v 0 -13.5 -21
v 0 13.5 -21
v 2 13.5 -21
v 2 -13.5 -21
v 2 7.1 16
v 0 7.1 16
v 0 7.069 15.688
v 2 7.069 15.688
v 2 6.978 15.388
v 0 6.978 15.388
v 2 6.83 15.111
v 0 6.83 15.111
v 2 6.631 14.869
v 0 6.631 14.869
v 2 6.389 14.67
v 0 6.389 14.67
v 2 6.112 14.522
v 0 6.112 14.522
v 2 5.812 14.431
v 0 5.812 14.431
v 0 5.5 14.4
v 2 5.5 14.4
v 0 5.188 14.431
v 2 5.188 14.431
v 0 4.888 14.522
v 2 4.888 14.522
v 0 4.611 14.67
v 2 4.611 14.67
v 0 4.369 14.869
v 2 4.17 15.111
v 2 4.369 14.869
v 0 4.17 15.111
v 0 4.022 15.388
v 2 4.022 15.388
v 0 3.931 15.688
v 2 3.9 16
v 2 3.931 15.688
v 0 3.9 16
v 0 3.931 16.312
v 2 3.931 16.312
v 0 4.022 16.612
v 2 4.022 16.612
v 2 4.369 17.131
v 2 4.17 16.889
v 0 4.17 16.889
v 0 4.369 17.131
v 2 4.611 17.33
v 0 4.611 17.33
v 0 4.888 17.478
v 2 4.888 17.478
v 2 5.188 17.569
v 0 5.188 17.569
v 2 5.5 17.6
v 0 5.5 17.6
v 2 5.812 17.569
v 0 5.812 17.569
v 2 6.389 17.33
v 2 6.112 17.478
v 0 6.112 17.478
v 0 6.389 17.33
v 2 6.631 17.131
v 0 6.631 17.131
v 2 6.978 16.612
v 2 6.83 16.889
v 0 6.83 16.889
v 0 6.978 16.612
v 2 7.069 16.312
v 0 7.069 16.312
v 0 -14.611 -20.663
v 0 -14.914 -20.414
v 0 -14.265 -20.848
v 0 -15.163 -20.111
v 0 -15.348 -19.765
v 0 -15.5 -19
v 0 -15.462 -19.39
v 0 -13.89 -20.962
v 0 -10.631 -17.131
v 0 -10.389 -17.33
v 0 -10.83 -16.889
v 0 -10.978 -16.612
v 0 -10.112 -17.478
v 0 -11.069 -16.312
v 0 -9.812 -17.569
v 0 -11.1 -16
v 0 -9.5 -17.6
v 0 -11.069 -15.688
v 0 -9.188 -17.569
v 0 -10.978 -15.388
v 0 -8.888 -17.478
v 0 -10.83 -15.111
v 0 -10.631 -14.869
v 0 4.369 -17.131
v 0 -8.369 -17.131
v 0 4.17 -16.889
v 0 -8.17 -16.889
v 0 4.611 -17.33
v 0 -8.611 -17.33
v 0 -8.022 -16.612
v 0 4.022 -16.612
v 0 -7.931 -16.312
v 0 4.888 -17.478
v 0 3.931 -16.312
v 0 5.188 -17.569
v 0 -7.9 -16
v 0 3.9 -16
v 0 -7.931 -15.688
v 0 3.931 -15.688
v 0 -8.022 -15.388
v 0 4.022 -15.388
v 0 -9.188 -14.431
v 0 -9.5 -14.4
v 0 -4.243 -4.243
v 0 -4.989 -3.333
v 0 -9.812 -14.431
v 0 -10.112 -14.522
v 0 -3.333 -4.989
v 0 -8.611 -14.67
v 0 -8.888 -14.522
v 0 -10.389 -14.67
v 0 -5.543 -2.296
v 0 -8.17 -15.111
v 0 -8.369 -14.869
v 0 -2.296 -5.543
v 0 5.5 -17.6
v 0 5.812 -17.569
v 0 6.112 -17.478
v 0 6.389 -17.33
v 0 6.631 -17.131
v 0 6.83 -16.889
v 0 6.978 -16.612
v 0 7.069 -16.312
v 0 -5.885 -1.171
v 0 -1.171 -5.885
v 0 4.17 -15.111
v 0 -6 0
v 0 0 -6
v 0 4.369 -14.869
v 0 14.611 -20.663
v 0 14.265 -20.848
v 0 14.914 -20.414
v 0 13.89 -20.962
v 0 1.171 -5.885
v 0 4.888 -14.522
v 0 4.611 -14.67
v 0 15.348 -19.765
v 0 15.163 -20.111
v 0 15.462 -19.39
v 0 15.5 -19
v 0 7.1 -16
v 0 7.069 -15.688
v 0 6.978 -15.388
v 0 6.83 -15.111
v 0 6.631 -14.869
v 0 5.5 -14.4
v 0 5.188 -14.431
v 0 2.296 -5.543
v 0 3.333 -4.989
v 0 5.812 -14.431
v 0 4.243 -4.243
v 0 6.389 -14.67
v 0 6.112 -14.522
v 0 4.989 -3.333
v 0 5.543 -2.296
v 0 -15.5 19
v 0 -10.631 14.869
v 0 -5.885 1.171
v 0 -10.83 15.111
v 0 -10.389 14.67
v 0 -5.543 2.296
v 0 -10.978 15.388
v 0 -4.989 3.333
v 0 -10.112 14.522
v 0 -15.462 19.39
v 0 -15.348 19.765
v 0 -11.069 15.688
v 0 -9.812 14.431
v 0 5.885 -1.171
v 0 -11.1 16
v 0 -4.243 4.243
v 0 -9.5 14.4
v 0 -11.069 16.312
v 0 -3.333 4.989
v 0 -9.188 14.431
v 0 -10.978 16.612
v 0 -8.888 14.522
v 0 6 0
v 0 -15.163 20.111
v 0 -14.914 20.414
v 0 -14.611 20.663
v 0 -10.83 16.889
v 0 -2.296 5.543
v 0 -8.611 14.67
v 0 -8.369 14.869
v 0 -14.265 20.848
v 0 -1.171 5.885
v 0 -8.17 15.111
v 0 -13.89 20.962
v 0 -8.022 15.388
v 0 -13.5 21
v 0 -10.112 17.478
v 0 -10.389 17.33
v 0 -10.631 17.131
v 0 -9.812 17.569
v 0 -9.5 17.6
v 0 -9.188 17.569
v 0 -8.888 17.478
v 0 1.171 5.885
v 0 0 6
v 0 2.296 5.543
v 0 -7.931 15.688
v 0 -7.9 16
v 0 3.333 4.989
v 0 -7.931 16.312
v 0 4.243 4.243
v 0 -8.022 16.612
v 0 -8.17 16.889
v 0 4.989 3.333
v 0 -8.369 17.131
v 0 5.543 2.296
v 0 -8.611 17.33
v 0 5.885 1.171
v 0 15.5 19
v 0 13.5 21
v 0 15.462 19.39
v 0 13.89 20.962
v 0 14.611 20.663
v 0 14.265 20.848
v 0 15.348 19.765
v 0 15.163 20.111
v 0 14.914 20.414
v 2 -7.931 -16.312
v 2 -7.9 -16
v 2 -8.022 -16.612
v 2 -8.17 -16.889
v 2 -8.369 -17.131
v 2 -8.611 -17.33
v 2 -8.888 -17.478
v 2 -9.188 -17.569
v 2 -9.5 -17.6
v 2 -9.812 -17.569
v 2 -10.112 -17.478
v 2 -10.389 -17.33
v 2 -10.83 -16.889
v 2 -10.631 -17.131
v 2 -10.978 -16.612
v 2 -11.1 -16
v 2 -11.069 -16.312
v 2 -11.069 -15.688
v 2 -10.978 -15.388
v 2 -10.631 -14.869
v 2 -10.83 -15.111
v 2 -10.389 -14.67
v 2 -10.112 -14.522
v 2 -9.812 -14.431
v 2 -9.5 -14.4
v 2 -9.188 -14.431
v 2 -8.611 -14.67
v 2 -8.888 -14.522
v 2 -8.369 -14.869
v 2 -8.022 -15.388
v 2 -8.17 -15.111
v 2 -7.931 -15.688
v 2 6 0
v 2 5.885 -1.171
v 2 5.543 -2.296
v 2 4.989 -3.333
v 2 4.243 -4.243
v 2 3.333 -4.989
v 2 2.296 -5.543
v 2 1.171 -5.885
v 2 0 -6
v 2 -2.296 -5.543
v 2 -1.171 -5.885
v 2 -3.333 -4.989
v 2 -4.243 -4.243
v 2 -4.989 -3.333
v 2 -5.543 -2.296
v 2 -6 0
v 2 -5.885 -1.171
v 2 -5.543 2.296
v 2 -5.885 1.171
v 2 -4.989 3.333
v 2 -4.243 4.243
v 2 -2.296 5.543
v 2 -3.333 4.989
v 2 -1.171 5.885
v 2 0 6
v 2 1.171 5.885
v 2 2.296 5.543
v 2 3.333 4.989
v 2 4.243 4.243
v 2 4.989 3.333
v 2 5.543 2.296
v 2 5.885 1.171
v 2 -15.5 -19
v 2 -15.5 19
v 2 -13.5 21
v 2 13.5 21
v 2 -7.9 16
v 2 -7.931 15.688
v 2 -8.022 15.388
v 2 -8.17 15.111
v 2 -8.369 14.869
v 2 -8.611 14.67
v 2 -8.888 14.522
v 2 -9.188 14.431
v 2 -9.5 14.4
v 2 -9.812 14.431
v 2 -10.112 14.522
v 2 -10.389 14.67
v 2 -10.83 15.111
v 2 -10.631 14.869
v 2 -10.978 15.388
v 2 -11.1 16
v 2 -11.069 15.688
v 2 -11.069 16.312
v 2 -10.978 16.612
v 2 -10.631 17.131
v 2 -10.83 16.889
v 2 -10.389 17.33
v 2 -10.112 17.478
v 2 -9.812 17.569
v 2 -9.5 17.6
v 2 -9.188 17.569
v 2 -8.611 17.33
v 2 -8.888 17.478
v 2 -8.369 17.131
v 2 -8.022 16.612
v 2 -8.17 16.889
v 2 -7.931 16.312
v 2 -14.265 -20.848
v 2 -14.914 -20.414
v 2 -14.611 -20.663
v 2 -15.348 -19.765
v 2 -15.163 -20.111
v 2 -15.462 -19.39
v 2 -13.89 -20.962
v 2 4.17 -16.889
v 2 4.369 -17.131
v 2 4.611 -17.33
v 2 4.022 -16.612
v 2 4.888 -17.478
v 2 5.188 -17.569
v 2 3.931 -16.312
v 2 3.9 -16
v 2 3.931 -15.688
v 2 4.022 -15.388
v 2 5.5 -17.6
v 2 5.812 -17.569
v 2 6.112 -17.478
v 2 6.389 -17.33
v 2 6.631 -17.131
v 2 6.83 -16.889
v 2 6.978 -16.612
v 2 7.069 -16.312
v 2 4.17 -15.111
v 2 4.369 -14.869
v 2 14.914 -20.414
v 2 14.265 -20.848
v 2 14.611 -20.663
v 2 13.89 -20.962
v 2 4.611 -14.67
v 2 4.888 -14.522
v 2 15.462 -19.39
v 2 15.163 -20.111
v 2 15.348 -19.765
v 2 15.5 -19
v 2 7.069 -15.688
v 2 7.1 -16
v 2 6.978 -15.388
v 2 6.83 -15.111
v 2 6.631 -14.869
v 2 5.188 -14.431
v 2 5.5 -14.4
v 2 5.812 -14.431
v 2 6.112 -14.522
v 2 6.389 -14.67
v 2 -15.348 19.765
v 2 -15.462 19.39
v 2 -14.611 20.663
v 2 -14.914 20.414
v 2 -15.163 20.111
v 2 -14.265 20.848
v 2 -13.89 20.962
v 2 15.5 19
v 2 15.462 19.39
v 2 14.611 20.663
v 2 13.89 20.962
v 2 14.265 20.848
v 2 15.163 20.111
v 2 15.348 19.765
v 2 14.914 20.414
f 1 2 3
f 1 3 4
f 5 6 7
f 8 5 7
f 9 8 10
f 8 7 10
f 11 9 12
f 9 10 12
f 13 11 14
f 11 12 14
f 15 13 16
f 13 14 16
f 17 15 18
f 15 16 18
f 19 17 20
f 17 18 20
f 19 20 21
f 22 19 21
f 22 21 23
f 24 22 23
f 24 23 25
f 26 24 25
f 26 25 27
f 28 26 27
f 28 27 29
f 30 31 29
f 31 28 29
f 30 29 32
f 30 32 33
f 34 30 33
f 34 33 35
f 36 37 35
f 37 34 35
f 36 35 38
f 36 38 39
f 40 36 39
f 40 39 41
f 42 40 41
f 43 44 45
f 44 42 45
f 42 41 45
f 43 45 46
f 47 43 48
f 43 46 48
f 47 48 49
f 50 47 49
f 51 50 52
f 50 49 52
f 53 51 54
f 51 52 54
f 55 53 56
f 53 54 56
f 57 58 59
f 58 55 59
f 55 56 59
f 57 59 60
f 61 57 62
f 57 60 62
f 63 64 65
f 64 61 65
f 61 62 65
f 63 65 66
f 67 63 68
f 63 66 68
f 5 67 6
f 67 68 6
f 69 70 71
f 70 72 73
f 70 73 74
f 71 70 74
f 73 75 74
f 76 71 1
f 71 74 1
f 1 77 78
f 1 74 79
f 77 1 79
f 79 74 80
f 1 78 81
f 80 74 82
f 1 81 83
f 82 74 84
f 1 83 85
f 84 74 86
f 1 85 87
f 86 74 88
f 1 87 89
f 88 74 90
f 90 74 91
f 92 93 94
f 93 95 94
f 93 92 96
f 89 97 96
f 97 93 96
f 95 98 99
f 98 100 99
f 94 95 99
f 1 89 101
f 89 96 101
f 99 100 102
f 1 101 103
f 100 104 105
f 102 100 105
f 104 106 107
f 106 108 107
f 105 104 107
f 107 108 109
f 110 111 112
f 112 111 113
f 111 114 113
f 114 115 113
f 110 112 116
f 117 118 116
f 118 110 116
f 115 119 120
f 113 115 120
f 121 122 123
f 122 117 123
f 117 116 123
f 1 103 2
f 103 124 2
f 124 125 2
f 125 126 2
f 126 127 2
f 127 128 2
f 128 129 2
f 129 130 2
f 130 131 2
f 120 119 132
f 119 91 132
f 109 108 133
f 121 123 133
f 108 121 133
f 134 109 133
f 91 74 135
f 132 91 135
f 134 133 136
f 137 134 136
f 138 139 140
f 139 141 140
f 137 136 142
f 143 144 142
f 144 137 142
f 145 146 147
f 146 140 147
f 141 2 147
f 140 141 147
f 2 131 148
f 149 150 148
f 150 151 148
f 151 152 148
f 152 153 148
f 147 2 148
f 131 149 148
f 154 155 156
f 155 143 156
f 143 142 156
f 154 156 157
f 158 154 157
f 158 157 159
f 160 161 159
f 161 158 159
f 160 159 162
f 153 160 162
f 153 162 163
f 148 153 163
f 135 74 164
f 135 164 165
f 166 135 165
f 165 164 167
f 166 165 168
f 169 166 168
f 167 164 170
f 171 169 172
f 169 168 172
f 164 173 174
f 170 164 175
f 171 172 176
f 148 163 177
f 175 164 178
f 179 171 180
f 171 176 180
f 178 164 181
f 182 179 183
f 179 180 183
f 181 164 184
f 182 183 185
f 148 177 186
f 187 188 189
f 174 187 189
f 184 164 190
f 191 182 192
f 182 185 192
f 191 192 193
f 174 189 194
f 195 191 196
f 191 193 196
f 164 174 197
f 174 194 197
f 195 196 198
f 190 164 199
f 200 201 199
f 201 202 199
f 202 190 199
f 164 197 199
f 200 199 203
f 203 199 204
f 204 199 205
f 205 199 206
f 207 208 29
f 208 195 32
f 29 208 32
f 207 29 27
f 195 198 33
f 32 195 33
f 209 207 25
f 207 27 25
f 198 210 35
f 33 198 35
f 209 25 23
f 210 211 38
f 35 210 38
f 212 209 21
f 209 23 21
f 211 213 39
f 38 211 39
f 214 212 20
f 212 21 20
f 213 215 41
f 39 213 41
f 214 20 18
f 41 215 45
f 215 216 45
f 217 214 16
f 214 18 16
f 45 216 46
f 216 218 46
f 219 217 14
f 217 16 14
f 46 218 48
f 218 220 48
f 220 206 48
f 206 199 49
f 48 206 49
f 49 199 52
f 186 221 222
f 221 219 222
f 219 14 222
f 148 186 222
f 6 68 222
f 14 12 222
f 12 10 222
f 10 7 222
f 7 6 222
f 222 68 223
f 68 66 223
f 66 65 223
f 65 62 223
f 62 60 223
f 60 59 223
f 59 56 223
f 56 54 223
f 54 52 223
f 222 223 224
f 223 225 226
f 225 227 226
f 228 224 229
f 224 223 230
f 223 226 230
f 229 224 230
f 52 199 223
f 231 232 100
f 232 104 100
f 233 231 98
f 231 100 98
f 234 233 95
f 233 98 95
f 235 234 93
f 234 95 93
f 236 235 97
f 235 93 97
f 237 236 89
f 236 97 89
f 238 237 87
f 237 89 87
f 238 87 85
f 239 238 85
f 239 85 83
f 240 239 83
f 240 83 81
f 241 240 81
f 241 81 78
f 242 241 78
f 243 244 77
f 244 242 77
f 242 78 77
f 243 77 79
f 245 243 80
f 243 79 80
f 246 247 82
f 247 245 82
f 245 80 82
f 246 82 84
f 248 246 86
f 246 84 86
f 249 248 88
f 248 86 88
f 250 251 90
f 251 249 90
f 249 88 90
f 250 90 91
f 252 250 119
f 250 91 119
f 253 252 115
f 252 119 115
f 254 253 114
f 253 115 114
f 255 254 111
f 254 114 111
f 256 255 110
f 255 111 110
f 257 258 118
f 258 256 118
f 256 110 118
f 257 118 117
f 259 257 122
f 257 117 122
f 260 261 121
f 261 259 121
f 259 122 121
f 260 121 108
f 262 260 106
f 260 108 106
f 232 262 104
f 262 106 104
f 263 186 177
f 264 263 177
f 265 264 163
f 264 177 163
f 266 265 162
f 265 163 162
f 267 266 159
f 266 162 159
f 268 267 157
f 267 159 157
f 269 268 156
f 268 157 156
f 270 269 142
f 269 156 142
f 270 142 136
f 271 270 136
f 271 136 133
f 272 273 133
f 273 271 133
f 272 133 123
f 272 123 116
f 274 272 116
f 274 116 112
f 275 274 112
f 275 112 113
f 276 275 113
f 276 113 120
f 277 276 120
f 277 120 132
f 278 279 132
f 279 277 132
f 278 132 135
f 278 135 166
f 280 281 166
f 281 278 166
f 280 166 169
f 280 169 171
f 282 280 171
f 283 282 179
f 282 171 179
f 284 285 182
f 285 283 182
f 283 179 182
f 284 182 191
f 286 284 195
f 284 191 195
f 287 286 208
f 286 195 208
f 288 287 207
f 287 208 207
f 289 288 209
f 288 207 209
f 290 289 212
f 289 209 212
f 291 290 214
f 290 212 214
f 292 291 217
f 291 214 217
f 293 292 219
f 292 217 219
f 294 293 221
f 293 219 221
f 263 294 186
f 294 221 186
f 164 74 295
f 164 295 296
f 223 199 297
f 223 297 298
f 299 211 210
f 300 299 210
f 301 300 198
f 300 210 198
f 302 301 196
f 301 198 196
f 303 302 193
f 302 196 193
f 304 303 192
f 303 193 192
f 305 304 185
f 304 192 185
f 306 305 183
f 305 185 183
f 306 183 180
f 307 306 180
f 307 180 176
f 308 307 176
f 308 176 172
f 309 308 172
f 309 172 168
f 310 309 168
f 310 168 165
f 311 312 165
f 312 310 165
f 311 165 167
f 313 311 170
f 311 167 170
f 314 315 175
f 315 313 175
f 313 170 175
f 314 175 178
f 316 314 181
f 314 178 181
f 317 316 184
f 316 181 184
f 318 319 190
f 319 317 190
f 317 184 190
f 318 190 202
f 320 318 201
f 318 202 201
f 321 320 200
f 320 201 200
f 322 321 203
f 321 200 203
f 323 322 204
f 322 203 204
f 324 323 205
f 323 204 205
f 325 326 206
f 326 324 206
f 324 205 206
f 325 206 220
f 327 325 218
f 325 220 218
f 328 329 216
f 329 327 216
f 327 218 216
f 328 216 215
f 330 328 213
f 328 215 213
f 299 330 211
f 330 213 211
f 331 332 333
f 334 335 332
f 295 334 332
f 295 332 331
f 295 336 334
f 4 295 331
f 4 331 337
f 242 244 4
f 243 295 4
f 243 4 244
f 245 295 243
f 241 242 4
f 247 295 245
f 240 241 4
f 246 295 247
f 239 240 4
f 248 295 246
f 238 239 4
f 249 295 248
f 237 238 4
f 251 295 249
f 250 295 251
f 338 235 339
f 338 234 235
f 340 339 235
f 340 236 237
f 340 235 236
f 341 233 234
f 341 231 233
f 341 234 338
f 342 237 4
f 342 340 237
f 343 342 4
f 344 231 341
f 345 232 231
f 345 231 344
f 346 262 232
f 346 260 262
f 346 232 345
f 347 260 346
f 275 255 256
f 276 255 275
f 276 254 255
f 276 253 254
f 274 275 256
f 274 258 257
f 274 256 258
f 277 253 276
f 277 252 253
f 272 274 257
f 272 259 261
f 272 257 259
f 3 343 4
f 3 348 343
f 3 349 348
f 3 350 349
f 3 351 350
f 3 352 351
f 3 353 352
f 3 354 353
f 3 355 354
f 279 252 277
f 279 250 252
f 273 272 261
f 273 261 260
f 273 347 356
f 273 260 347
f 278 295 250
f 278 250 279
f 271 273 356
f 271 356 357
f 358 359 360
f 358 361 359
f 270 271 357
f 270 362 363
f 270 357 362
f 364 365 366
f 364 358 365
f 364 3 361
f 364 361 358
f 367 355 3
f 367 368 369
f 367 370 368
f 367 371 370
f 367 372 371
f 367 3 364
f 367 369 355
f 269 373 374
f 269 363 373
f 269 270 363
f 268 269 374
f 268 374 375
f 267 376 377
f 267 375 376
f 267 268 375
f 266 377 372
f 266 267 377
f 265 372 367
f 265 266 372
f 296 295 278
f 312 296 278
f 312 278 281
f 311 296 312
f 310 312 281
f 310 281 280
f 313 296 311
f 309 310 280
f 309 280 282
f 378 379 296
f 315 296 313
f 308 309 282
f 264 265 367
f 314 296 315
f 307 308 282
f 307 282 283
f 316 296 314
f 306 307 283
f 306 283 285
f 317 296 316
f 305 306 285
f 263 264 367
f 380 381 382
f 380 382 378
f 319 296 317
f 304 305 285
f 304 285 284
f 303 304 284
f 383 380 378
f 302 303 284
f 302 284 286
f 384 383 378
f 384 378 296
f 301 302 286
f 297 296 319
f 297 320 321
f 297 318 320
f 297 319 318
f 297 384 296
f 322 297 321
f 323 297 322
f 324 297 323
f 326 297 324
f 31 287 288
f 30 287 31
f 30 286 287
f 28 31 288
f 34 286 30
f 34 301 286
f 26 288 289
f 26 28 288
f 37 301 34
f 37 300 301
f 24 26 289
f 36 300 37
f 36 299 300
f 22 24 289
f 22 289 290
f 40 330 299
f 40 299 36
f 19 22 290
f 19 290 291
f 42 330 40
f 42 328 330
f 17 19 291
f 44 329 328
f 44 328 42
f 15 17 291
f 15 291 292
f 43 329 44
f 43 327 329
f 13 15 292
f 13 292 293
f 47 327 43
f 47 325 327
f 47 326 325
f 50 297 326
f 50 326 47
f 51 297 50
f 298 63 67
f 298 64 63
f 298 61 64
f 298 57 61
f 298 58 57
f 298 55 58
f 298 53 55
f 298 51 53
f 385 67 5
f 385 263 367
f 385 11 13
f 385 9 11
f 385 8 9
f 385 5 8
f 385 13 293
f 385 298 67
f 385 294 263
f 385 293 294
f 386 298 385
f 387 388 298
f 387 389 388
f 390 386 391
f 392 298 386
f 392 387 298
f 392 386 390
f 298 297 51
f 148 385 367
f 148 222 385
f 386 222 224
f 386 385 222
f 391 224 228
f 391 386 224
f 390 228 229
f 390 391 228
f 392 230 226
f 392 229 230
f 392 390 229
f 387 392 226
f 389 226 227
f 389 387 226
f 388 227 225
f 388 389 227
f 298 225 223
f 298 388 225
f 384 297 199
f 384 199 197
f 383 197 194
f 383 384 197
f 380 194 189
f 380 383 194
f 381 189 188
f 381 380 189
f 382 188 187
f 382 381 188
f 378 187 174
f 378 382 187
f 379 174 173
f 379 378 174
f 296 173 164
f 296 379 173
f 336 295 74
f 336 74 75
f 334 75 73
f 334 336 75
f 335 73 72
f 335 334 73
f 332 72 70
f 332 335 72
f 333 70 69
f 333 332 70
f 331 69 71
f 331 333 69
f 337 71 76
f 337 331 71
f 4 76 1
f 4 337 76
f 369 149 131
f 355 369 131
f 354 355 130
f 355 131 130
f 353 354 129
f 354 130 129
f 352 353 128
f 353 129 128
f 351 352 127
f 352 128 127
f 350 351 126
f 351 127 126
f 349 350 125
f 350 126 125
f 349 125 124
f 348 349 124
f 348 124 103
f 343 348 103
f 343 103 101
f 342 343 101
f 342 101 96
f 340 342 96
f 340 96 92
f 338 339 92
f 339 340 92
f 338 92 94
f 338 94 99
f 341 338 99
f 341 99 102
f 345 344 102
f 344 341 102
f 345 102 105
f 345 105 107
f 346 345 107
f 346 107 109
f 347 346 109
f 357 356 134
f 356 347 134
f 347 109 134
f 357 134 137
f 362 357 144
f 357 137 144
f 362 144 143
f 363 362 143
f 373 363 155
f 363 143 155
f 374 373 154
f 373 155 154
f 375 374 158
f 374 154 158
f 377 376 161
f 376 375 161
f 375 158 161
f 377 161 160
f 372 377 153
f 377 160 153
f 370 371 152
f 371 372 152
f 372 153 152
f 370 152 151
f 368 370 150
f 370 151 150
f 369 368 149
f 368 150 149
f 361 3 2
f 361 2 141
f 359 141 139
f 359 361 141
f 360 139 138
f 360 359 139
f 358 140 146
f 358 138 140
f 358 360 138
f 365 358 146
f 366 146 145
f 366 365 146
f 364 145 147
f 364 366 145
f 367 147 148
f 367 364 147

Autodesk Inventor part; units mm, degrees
ref_plane "YZ Plane" through (0, 0, 0) normal (1, 0, 0) x (0, 1, 0)
ref_plane "XZ Plane" through (0, 0, 0) normal (0, 1, 0) x (-1, 0, 0)
ref_plane "XY Plane" through (0, 0, 0) normal (0, 0, 1) x (1, 0, 0)
sketch "Sketch1" plane through (0, 0, 0) normal (1, 0, 0) x (0, 1, 0)
  line L0 (-15.5, 21) -> (15.5, 21)
  line L1 (15.5, 21) -> (15.5, -21)
  line L2 (15.5, -21) -> (-15.5, -21)
  line L3 (-15.5, -21) -> (-15.5, 21)
  line L4 (-15.5, 21) -> (15.5, -21) construction
  line L5 (15.5, 21) -> (-15.5, -21) construction
  circle A0 centre (5.5, 16) radius 1.6
  circle A1 centre (5.5, -16) radius 1.6
  circle A2 centre (-9.5, -16) radius 1.6
  circle A3 centre (-9.5, 16) radius 1.6
  circle A4 centre (0, 0) radius 6
  point P0 (5.5, -16)
  point P1 (-9.5, -16)
  dimension "d0" = 42
  dimension "d1" = 31
  dimension "d2" = 5
  dimension "d3" = 10
  dimension "d5" = 15
  dimension "d6" = 5
  dimension "d7" = 3.2
  dimension "d8" = 3.2
  dimension "d9" = 3.2
  dimension "d10" = 3.2
  dimension "d11" = 12
extrude "Extrusion1" add sketch "Sketch1" along normal blind 2
fillet "Fillet1" radius 2 4 edges at (1, 15.5, 21) (1, -15.5, 21) (1, -15.5, -21) (1, 15.5, -21)
properties part number "2mm_double_for_pulley" material "アルミニウム 6061"
